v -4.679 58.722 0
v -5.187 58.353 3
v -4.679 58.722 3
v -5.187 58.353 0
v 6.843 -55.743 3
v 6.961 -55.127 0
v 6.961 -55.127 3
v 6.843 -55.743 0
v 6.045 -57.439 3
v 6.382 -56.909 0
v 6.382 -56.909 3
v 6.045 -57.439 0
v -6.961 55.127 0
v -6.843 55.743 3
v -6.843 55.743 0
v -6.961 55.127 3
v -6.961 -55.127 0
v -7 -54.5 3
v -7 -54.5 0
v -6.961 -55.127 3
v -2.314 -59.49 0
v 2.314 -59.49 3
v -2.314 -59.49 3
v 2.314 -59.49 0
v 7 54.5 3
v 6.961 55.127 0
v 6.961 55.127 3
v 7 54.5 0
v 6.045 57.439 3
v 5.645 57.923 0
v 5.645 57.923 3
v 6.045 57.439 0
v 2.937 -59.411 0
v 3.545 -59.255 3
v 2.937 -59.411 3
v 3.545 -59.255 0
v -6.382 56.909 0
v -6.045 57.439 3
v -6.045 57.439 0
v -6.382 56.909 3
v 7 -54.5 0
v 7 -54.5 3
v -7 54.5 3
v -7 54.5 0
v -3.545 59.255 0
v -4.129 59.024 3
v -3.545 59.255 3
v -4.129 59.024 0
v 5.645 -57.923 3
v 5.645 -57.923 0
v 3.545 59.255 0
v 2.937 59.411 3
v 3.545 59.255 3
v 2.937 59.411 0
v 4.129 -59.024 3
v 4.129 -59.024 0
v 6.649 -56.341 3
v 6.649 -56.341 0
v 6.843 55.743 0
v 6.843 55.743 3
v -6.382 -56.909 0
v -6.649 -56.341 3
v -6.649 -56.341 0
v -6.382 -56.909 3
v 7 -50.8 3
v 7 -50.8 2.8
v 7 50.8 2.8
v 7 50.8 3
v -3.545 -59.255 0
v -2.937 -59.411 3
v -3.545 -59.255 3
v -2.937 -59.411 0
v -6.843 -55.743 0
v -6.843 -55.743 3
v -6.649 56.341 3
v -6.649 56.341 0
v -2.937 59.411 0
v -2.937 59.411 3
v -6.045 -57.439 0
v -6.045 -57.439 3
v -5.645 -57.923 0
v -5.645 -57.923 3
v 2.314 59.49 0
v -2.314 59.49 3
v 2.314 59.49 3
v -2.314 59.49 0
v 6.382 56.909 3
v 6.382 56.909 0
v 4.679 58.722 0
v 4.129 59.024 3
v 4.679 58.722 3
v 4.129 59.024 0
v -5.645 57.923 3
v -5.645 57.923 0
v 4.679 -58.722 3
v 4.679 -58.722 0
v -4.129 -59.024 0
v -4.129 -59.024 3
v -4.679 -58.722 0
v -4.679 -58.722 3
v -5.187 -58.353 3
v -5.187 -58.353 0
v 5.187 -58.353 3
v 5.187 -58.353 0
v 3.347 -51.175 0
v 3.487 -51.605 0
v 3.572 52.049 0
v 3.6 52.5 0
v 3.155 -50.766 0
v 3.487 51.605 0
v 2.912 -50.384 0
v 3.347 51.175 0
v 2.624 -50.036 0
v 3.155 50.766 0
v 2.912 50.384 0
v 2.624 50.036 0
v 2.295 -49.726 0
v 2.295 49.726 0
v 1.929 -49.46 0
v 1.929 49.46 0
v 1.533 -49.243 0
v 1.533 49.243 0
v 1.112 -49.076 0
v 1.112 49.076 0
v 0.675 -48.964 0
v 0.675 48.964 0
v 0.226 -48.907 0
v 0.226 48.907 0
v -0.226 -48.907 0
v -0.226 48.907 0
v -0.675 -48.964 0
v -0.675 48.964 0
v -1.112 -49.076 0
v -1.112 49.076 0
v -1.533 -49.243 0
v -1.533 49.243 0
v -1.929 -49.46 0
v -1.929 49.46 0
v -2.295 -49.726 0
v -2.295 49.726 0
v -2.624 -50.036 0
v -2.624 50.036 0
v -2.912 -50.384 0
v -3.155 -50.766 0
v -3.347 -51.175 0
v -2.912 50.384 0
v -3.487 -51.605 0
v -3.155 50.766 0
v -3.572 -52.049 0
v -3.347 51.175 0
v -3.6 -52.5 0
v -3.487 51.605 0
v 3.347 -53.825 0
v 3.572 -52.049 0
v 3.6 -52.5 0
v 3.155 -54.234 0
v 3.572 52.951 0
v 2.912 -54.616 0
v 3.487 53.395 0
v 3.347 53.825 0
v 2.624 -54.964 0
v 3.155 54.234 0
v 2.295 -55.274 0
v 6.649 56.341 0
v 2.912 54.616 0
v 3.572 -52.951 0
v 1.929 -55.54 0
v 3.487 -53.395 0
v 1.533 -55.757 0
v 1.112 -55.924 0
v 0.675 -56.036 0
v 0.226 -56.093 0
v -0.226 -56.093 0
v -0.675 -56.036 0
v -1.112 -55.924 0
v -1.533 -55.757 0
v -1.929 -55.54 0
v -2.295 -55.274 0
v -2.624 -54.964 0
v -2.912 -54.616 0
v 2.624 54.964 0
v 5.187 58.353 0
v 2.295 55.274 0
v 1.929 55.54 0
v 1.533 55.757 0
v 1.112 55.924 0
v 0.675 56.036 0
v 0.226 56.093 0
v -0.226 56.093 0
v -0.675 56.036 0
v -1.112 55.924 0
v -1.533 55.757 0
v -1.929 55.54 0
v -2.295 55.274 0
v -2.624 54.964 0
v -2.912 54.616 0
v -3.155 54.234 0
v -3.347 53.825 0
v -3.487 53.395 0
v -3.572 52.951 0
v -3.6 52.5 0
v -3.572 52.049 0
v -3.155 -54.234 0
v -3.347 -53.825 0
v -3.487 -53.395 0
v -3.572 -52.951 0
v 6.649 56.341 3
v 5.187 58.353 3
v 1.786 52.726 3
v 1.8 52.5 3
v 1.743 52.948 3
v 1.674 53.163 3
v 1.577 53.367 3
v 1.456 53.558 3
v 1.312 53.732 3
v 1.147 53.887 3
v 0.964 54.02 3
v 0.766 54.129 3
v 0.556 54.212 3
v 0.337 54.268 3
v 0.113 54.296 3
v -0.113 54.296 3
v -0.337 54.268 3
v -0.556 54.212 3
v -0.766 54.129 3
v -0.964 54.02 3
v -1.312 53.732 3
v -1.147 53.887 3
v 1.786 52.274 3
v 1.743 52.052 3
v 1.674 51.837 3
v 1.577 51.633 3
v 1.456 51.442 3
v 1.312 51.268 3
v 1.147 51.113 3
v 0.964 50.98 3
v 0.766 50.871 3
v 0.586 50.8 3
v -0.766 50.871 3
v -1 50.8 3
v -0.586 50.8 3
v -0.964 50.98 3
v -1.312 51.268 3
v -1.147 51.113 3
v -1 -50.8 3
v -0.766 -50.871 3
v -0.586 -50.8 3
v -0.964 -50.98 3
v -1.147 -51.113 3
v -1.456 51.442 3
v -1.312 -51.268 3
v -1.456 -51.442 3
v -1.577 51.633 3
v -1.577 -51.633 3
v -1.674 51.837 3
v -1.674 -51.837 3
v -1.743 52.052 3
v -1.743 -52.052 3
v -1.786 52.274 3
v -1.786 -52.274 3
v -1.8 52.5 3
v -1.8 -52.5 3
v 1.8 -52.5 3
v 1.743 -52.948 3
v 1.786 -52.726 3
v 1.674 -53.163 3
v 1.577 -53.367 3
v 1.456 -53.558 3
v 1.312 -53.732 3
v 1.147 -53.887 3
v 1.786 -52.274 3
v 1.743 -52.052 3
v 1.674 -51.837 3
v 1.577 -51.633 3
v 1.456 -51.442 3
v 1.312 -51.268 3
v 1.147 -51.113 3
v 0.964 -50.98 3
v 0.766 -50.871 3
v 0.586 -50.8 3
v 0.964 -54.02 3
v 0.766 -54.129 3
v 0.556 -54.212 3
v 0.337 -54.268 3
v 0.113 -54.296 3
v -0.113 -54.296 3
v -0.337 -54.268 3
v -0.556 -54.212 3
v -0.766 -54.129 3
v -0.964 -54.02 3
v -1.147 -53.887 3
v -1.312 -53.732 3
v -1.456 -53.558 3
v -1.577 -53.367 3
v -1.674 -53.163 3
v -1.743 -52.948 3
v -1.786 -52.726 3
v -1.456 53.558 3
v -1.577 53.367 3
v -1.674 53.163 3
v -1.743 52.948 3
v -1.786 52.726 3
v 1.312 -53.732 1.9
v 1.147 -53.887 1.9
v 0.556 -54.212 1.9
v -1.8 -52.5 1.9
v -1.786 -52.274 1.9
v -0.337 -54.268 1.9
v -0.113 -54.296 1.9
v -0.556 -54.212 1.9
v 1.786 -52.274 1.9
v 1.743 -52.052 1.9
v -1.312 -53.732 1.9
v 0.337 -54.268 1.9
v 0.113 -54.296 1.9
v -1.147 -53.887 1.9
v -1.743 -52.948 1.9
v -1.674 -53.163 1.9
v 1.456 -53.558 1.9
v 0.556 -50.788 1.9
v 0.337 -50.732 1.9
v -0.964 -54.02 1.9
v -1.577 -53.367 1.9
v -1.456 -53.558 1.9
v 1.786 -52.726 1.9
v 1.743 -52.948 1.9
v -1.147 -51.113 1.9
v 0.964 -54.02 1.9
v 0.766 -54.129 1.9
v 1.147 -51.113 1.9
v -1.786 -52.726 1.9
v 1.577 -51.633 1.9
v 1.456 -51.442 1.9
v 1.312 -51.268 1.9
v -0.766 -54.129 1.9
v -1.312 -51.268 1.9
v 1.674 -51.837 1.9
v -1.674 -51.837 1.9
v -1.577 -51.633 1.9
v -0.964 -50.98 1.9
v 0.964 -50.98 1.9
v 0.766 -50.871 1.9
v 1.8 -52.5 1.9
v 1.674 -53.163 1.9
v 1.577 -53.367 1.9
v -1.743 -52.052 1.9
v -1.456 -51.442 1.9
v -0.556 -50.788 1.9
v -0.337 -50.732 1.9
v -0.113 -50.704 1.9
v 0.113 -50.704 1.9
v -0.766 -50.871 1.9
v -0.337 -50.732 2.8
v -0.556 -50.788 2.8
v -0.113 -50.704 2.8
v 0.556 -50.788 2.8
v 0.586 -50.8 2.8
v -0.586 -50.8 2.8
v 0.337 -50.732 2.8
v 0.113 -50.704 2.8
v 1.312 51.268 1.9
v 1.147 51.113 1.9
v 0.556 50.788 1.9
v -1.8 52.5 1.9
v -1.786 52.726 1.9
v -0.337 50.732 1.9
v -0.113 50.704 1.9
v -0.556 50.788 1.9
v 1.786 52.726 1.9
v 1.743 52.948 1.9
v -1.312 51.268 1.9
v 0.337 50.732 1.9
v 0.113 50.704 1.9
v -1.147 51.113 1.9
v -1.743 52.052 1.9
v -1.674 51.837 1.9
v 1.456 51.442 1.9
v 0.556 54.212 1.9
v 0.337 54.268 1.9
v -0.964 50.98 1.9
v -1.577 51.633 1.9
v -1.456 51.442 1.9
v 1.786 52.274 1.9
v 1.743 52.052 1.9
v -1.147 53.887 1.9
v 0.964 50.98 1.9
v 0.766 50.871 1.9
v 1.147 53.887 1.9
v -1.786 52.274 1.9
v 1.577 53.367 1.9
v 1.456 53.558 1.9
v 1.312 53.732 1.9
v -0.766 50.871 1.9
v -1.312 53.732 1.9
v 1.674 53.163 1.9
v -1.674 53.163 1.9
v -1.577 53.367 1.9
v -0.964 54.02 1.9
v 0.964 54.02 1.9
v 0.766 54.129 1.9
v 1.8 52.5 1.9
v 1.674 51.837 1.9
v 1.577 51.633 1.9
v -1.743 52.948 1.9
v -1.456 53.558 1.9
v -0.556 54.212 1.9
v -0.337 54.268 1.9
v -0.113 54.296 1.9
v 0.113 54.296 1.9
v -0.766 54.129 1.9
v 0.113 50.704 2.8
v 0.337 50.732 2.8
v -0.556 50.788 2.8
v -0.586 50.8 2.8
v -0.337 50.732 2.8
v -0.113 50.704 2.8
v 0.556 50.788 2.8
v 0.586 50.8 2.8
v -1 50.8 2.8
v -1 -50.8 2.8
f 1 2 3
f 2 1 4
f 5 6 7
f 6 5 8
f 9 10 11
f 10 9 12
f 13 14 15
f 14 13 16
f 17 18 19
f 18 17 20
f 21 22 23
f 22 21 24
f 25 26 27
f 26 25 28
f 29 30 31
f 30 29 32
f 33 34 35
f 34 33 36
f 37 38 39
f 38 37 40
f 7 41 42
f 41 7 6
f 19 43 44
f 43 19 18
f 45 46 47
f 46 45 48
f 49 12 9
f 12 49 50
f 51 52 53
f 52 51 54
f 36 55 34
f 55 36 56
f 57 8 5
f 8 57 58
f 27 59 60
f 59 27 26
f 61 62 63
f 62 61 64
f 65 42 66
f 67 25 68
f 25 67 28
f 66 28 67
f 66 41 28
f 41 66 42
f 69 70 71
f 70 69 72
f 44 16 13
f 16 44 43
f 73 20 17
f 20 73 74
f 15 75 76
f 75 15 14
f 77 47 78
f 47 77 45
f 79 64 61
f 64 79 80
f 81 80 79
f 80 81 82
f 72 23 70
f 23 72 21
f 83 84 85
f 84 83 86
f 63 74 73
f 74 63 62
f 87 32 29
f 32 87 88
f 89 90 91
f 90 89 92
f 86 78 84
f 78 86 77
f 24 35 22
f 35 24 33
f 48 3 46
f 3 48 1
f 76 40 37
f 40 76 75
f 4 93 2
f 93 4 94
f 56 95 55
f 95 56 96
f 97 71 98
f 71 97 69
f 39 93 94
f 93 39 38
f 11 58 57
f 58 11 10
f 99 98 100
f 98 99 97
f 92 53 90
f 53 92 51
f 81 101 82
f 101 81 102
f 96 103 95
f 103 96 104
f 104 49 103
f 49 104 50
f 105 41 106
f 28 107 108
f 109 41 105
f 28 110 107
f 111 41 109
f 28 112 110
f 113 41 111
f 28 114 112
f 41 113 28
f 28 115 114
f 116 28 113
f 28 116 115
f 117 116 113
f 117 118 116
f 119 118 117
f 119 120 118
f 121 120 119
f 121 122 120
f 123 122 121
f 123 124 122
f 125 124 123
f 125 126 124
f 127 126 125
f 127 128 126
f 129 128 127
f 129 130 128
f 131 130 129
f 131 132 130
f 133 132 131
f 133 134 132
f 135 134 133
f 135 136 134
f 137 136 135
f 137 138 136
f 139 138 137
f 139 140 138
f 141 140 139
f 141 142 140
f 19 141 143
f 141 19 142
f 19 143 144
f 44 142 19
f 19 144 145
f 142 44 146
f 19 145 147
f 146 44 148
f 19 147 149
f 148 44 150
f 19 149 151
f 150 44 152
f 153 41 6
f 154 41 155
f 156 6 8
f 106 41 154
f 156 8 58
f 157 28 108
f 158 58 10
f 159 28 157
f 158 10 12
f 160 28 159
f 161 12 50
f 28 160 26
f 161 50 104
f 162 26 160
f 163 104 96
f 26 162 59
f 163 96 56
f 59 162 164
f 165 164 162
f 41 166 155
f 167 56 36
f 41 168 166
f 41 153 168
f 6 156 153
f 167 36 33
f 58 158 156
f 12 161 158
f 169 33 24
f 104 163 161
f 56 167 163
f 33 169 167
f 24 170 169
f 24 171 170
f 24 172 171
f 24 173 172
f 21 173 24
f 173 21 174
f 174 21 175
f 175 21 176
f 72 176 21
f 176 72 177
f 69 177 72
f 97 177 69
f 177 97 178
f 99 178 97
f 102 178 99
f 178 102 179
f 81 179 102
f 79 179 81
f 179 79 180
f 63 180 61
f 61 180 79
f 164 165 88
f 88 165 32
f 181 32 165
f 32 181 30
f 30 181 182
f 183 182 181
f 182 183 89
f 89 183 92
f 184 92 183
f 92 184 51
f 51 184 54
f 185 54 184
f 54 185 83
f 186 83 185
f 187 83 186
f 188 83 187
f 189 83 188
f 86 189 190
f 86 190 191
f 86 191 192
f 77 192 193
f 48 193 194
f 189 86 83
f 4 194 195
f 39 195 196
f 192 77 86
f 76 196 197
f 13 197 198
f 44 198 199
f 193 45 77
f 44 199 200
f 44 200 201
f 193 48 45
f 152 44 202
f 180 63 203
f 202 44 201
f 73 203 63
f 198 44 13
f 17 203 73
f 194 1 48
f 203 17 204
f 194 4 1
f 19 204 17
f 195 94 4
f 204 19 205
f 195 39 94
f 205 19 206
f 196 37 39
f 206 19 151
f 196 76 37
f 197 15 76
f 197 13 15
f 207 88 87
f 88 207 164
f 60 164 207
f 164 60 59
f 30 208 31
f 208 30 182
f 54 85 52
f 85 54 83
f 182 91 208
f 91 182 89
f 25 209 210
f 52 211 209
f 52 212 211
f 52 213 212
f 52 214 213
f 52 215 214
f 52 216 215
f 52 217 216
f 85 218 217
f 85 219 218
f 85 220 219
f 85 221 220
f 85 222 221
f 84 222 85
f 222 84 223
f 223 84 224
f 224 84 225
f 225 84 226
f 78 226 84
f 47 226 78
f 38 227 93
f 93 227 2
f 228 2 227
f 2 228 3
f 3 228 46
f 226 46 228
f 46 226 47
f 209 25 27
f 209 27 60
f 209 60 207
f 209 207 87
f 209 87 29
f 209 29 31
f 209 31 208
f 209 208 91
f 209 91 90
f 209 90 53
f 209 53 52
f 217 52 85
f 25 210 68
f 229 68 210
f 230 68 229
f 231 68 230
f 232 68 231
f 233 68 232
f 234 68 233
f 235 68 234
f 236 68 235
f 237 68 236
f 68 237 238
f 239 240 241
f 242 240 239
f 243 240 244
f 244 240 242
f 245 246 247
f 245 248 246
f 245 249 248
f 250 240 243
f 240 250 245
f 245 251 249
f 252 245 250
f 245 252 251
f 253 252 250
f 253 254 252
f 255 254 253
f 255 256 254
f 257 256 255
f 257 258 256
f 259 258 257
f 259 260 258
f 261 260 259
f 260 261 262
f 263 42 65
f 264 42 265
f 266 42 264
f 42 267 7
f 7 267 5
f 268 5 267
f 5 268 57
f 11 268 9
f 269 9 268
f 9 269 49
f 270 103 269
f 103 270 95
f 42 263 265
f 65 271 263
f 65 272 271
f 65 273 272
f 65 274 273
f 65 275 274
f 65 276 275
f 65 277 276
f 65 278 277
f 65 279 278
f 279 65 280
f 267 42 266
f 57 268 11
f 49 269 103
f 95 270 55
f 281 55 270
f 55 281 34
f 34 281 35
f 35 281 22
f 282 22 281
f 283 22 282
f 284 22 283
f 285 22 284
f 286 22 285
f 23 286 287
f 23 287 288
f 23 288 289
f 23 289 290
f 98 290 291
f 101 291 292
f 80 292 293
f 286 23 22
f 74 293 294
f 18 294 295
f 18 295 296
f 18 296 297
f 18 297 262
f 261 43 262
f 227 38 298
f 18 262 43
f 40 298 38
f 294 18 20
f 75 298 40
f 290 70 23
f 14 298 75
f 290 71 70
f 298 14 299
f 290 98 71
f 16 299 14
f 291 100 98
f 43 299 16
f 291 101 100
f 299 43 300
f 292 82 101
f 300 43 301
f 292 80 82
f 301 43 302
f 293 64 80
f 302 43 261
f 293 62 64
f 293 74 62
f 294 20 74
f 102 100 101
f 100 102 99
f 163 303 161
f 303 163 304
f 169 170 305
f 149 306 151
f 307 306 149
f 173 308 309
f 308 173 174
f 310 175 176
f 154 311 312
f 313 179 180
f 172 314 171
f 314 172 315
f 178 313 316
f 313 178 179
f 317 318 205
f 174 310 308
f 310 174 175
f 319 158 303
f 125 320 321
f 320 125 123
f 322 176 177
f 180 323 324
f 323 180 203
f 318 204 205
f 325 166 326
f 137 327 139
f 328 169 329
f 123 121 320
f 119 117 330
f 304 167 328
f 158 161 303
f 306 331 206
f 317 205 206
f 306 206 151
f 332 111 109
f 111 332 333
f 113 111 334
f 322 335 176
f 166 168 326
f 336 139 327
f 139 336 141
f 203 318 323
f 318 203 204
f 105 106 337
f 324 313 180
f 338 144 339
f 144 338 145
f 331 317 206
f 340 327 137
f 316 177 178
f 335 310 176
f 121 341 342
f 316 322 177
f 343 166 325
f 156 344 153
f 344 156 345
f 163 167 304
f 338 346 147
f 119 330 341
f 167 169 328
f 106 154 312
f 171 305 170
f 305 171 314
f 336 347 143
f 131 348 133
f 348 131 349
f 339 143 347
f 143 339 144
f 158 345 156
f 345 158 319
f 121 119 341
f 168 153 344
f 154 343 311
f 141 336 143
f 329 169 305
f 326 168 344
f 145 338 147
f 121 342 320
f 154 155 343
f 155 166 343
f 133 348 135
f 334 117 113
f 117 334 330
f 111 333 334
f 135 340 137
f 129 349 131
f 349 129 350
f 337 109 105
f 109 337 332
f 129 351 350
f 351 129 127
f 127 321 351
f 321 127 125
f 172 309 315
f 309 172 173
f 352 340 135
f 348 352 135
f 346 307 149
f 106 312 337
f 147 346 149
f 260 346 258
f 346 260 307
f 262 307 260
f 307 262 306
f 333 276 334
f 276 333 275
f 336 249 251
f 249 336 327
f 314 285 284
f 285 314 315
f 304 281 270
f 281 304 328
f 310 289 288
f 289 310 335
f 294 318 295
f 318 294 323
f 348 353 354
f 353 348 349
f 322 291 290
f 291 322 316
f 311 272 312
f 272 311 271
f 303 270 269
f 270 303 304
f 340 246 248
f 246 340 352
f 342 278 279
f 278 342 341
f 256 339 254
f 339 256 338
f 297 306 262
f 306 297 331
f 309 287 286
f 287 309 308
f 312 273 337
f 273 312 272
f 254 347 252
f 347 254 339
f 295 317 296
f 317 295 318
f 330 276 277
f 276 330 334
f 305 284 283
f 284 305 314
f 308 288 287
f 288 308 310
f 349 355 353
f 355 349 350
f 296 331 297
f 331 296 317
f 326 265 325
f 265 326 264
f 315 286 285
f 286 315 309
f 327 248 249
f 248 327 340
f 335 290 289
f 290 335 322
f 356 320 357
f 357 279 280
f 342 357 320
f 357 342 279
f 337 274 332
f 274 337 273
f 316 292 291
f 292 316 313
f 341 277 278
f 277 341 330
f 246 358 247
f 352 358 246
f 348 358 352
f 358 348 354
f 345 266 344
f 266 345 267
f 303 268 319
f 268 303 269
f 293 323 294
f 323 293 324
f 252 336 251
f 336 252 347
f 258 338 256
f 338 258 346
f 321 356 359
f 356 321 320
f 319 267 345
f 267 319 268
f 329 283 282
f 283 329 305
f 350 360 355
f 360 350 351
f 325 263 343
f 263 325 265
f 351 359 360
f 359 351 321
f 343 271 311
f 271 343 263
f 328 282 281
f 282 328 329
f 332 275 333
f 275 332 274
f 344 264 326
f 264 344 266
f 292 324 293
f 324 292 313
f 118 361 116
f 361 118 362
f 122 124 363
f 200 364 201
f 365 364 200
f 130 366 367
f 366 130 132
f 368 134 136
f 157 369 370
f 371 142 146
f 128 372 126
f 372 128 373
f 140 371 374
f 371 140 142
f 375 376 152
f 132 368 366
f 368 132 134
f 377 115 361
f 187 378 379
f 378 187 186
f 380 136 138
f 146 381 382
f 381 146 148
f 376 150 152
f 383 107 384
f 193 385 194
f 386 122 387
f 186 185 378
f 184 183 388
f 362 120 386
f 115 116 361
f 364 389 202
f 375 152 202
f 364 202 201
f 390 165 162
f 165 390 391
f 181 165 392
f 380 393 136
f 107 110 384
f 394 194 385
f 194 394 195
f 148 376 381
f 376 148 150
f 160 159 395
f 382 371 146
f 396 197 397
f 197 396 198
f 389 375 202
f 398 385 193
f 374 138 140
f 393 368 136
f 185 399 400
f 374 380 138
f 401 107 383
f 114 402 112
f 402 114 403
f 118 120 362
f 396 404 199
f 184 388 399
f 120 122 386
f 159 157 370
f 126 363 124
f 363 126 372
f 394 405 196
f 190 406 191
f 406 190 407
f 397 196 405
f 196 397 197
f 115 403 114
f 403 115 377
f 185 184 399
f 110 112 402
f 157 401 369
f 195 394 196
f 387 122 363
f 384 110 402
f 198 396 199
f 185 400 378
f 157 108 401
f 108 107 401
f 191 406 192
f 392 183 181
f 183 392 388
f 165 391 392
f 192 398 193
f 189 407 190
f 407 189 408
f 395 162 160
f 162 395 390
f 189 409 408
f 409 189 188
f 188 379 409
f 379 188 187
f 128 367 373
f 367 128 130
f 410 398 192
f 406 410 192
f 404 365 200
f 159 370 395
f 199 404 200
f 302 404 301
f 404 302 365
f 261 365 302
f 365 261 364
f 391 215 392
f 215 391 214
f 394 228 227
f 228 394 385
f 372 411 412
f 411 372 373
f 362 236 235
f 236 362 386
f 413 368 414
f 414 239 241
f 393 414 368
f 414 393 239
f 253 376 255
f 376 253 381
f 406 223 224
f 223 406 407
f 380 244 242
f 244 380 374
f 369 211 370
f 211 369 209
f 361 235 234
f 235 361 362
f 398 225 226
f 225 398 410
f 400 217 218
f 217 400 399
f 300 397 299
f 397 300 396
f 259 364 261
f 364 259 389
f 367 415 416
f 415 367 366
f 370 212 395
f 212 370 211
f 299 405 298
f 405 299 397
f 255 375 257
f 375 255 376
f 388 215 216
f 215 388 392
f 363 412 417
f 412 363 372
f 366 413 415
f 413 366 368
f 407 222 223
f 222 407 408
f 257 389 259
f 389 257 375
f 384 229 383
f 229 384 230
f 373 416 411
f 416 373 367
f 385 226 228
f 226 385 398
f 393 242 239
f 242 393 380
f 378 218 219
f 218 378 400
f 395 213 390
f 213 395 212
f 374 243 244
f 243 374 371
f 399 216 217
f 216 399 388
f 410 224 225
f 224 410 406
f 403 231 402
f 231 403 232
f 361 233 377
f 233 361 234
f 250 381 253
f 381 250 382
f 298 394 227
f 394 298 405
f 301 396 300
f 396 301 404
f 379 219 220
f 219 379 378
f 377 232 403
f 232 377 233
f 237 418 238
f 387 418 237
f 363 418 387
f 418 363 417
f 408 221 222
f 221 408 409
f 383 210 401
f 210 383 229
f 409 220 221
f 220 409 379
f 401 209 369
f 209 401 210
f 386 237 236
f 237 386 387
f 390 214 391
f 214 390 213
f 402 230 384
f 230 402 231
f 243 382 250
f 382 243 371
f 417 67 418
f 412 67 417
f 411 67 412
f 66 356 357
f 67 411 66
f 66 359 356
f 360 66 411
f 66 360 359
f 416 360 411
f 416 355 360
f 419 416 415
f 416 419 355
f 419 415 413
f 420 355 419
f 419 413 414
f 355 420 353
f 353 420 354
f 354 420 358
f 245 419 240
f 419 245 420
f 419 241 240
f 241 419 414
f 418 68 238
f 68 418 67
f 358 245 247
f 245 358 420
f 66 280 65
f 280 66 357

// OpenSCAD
$fn = 50;


difference() {
	union() {
		hull() {
			translate(v = [-2.0000000000, 54.5000000000, 0]) {
				cylinder(h = 3, r = 5);
			}
			translate(v = [2.0000000000, 54.5000000000, 0]) {
				cylinder(h = 3, r = 5);
			}
			translate(v = [-2.0000000000, -54.5000000000, 0]) {
				cylinder(h = 3, r = 5);
			}
			translate(v = [2.0000000000, -54.5000000000, 0]) {
				cylinder(h = 3, r = 5);
			}
		}
		hull() {
			translate(v = [-2.0000000000, 54.5000000000, 0]) {
				cylinder(h = 3, r = 5);
			}
			translate(v = [2.0000000000, 54.5000000000, 0]) {
				cylinder(h = 3, r = 5);
			}
			translate(v = [-2.0000000000, -54.5000000000, 0]) {
				cylinder(h = 3, r = 5);
			}
			translate(v = [2.0000000000, -54.5000000000, 0]) {
				cylinder(h = 3, r = 5);
			}
		}
	}
	union() {
		translate(v = [0, -52.5000000000, 0]) {
			rotate(a = [0, 180, 0]) {
				difference() {
					union() {
						translate(v = [0, 0, -17.0000000000]) {
							rotate(a = [0, 0, 0]) {
								difference() {
									union() {
										#translate(v = [-1.7500000000, -3.2500000000, -0.3000000000]) {
											cube(size = [3.5000000000, 6.5000000000, 0.3000000000]);
										}
										#translate(v = [-1.7500000000, -1.7500000000, -0.6000000000]) {
											cube(size = [3.5000000000, 3.5000000000, 0.3000000000]);
										}
										#translate(v = [-1.7500000000, -3.2500000000, 2.5000000000]) {
											cube(size = [3.5000000000, 6.5000000000, 0.3000000000]);
										}
										#translate(v = [-1.7500000000, -1.7500000000, 2.8000000000]) {
											cube(size = [3.5000000000, 3.5000000000, 0.3000000000]);
										}
										#linear_extrude(height = 2.5000000000) {
											polygon(points = [[3.4620000000, 0.0000000000], [1.7310000000, 2.9981799479], [-1.7310000000, 2.9981799479], [-3.4620000000, 0.0000000000], [-1.7310000000, -2.9981799479], [1.7310000000, -2.9981799479]]);
										}
										#translate(v = [-1.7500000000, -3.2500000000, -0.3000000000]) {
											cube(size = [3.5000000000, 6.5000000000, 0.3000000000]);
										}
										#translate(v = [-1.7500000000, -1.7500000000, -0.6000000000]) {
											cube(size = [3.5000000000, 3.5000000000, 0.3000000000]);
										}
										#translate(v = [-1.7500000000, -3.2500000000, 2.5000000000]) {
											cube(size = [3.5000000000, 6.5000000000, 0.3000000000]);
										}
										#translate(v = [-1.7500000000, -1.7500000000, 2.8000000000]) {
											cube(size = [3.5000000000, 3.5000000000, 0.3000000000]);
										}
										#translate(v = [-1.7500000000, -3.2500000000, -0.3000000000]) {
											cube(size = [3.5000000000, 6.5000000000, 0.3000000000]);
										}
										#translate(v = [-1.7500000000, -1.7500000000, -0.6000000000]) {
											cube(size = [3.5000000000, 3.5000000000, 0.3000000000]);
										}
										#translate(v = [-1.7500000000, -3.2500000000, 2.5000000000]) {
											cube(size = [3.5000000000, 6.5000000000, 0.3000000000]);
										}
										#translate(v = [-1.7500000000, -1.7500000000, 2.8000000000]) {
											cube(size = [3.5000000000, 3.5000000000, 0.3000000000]);
										}
									}
									union();
								}
							}
						}
						translate(v = [0, 0, -17.0000000000]) {
							rotate(a = [0, 0, 0]) {
								difference() {
									union() {
										#translate(v = [-1.7500000000, -3.2500000000, -0.3000000000]) {
											cube(size = [3.5000000000, 6.5000000000, 0.3000000000]);
										}
										#translate(v = [-1.7500000000, -1.7500000000, -0.6000000000]) {
											cube(size = [3.5000000000, 3.5000000000, 0.3000000000]);
										}
										#translate(v = [-1.7500000000, -3.2500000000, 2.5000000000]) {
											cube(size = [3.5000000000, 6.5000000000, 0.3000000000]);
										}
										#translate(v = [-1.7500000000, -1.7500000000, 2.8000000000]) {
											cube(size = [3.5000000000, 3.5000000000, 0.3000000000]);
										}
										#linear_extrude(height = 2.5000000000) {
											polygon(points = [[3.4620000000, 0.0000000000], [1.7310000000, 2.9981799479], [-1.7310000000, 2.9981799479], [-3.4620000000, 0.0000000000], [-1.7310000000, -2.9981799479], [1.7310000000, -2.9981799479]]);
										}
										#translate(v = [-1.7500000000, -3.2500000000, -0.3000000000]) {
											cube(size = [3.5000000000, 6.5000000000, 0.3000000000]);
										}
										#translate(v = [-1.7500000000, -1.7500000000, -0.6000000000]) {
											cube(size = [3.5000000000, 3.5000000000, 0.3000000000]);
										}
										#translate(v = [-1.7500000000, -3.2500000000, 2.5000000000]) {
											cube(size = [3.5000000000, 6.5000000000, 0.3000000000]);
										}
										#translate(v = [-1.7500000000, -1.7500000000, 2.8000000000]) {
											cube(size = [3.5000000000, 3.5000000000, 0.3000000000]);
										}
										#translate(v = [-1.7500000000, -3.2500000000, -0.3000000000]) {
											cube(size = [3.5000000000, 6.5000000000, 0.3000000000]);
										}
										#translate(v = [-1.7500000000, -1.7500000000, -0.6000000000]) {
											cube(size = [3.5000000000, 3.5000000000, 0.3000000000]);
										}
										#translate(v = [-1.7500000000, -3.2500000000, 2.5000000000]) {
											cube(size = [3.5000000000, 6.5000000000, 0.3000000000]);
										}
										#translate(v = [-1.7500000000, -1.7500000000, 2.8000000000]) {
											cube(size = [3.5000000000, 3.5000000000, 0.3000000000]);
										}
									}
									union();
								}
							}
						}
						translate(v = [0, 0, -17.0000000000]) {
							rotate(a = [0, 0, 0]) {
								difference() {
									union() {
										#translate(v = [-1.7500000000, -3.2500000000, -0.3000000000]) {
											cube(size = [3.5000000000, 6.5000000000, 0.3000000000]);
										}
										#translate(v = [-1.7500000000, -1.7500000000, -0.6000000000]) {
											cube(size = [3.5000000000, 3.5000000000, 0.3000000000]);
										}
										#translate(v = [-1.7500000000, -3.2500000000, 2.5000000000]) {
											cube(size = [3.5000000000, 6.5000000000, 0.3000000000]);
										}
										#translate(v = [-1.7500000000, -1.7500000000, 2.8000000000]) {
											cube(size = [3.5000000000, 3.5000000000, 0.3000000000]);
										}
										#linear_extrude(height = 2.5000000000) {
											polygon(points = [[3.4620000000, 0.0000000000], [1.7310000000, 2.9981799479], [-1.7310000000, 2.9981799479], [-3.4620000000, 0.0000000000], [-1.7310000000, -2.9981799479], [1.7310000000, -2.9981799479]]);
										}
										#translate(v = [-1.7500000000, -3.2500000000, -0.3000000000]) {
											cube(size = [3.5000000000, 6.5000000000, 0.3000000000]);
										}
										#translate(v = [-1.7500000000, -1.7500000000, -0.6000000000]) {
											cube(size = [3.5000000000, 3.5000000000, 0.3000000000]);
										}
										#translate(v = [-1.7500000000, -3.2500000000, 2.5000000000]) {
											cube(size = [3.5000000000, 6.5000000000, 0.3000000000]);
										}
										#translate(v = [-1.7500000000, -1.7500000000, 2.8000000000]) {
											cube(size = [3.5000000000, 3.5000000000, 0.3000000000]);
										}
										#translate(v = [-1.7500000000, -3.2500000000, -0.3000000000]) {
											cube(size = [3.5000000000, 6.5000000000, 0.3000000000]);
										}
										#translate(v = [-1.7500000000, -1.7500000000, -0.6000000000]) {
											cube(size = [3.5000000000, 3.5000000000, 0.3000000000]);
										}
										#translate(v = [-1.7500000000, -3.2500000000, 2.5000000000]) {
											cube(size = [3.5000000000, 6.5000000000, 0.3000000000]);
										}
										#translate(v = [-1.7500000000, -1.7500000000, 2.8000000000]) {
											cube(size = [3.5000000000, 3.5000000000, 0.3000000000]);
										}
									}
									union();
								}
							}
						}
						#translate(v = [0, 0, -17.0000000000]) {
							cylinder(h = 17, r = 1.5000000000);
						}
						#translate(v = [0, 0, -1.9000000000]) {
							cylinder(h = 1.9000000000, r1 = 1.8000000000, r2 = 3.6000000000);
						}
						#translate(v = [0, 0, -17.0000000000]) {
							cylinder(h = 17, r = 1.8000000000);
						}
						#translate(v = [0, 0, -17.0000000000]) {
							cylinder(h = 17, r = 1.5000000000);
						}
					}
					union();
				}
			}
		}
		translate(v = [0, 52.5000000000, 0]) {
			rotate(a = [0, 180, 0]) {
				difference() {
					union() {
						translate(v = [0, 0, -17.0000000000]) {
							rotate(a = [0, 0, 0]) {
								difference() {
									union() {
										#translate(v = [-1.7500000000, -3.2500000000, -0.3000000000]) {
											cube(size = [3.5000000000, 6.5000000000, 0.3000000000]);
										}
										#translate(v = [-1.7500000000, -1.7500000000, -0.6000000000]) {
											cube(size = [3.5000000000, 3.5000000000, 0.3000000000]);
										}
										#translate(v = [-1.7500000000, -3.2500000000, 2.5000000000]) {
											cube(size = [3.5000000000, 6.5000000000, 0.3000000000]);
										}
										#translate(v = [-1.7500000000, -1.7500000000, 2.8000000000]) {
											cube(size = [3.5000000000, 3.5000000000, 0.3000000000]);
										}
										#linear_extrude(height = 2.5000000000) {
											polygon(points = [[3.4620000000, 0.0000000000], [1.7310000000, 2.9981799479], [-1.7310000000, 2.9981799479], [-3.4620000000, 0.0000000000], [-1.7310000000, -2.9981799479], [1.7310000000, -2.9981799479]]);
										}
										#translate(v = [-1.7500000000, -3.2500000000, -0.3000000000]) {
											cube(size = [3.5000000000, 6.5000000000, 0.3000000000]);
										}
										#translate(v = [-1.7500000000, -1.7500000000, -0.6000000000]) {
											cube(size = [3.5000000000, 3.5000000000, 0.3000000000]);
										}
										#translate(v = [-1.7500000000, -3.2500000000, 2.5000000000]) {
											cube(size = [3.5000000000, 6.5000000000, 0.3000000000]);
										}
										#translate(v = [-1.7500000000, -1.7500000000, 2.8000000000]) {
											cube(size = [3.5000000000, 3.5000000000, 0.3000000000]);
										}
										#translate(v = [-1.7500000000, -3.2500000000, -0.3000000000]) {
											cube(size = [3.5000000000, 6.5000000000, 0.3000000000]);
										}
										#translate(v = [-1.7500000000, -1.7500000000, -0.6000000000]) {
											cube(size = [3.5000000000, 3.5000000000, 0.3000000000]);
										}
										#translate(v = [-1.7500000000, -3.2500000000, 2.5000000000]) {
											cube(size = [3.5000000000, 6.5000000000, 0.3000000000]);
										}
										#translate(v = [-1.7500000000, -1.7500000000, 2.8000000000]) {
											cube(size = [3.5000000000, 3.5000000000, 0.3000000000]);
										}
									}
									union();
								}
							}
						}
						translate(v = [0, 0, -17.0000000000]) {
							rotate(a = [0, 0, 0]) {
								difference() {
									union() {
										#translate(v = [-1.7500000000, -3.2500000000, -0.3000000000]) {
											cube(size = [3.5000000000, 6.5000000000, 0.3000000000]);
										}
										#translate(v = [-1.7500000000, -1.7500000000, -0.6000000000]) {
											cube(size = [3.5000000000, 3.5000000000, 0.3000000000]);
										}
										#translate(v = [-1.7500000000, -3.2500000000, 2.5000000000]) {
											cube(size = [3.5000000000, 6.5000000000, 0.3000000000]);
										}
										#translate(v = [-1.7500000000, -1.7500000000, 2.8000000000]) {
											cube(size = [3.5000000000, 3.5000000000, 0.3000000000]);
										}
										#linear_extrude(height = 2.5000000000) {
											polygon(points = [[3.4620000000, 0.0000000000], [1.7310000000, 2.9981799479], [-1.7310000000, 2.9981799479], [-3.4620000000, 0.0000000000], [-1.7310000000, -2.9981799479], [1.7310000000, -2.9981799479]]);
										}
										#translate(v = [-1.7500000000, -3.2500000000, -0.3000000000]) {
											cube(size = [3.5000000000, 6.5000000000, 0.3000000000]);
										}
										#translate(v = [-1.7500000000, -1.7500000000, -0.6000000000]) {
											cube(size = [3.5000000000, 3.5000000000, 0.3000000000]);
										}
										#translate(v = [-1.7500000000, -3.2500000000, 2.5000000000]) {
											cube(size = [3.5000000000, 6.5000000000, 0.3000000000]);
										}
										#translate(v = [-1.7500000000, -1.7500000000, 2.8000000000]) {
											cube(size = [3.5000000000, 3.5000000000, 0.3000000000]);
										}
										#translate(v = [-1.7500000000, -3.2500000000, -0.3000000000]) {
											cube(size = [3.5000000000, 6.5000000000, 0.3000000000]);
										}
										#translate(v = [-1.7500000000, -1.7500000000, -0.6000000000]) {
											cube(size = [3.5000000000, 3.5000000000, 0.3000000000]);
										}
										#translate(v = [-1.7500000000, -3.2500000000, 2.5000000000]) {
											cube(size = [3.5000000000, 6.5000000000, 0.3000000000]);
										}
										#translate(v = [-1.7500000000, -1.7500000000, 2.8000000000]) {
											cube(size = [3.5000000000, 3.5000000000, 0.3000000000]);
										}
									}
									union();
								}
							}
						}
						translate(v = [0, 0, -17.0000000000]) {
							rotate(a = [0, 0, 0]) {
								difference() {
									union() {
										#translate(v = [-1.7500000000, -3.2500000000, -0.3000000000]) {
											cube(size = [3.5000000000, 6.5000000000, 0.3000000000]);
										}
										#translate(v = [-1.7500000000, -1.7500000000, -0.6000000000]) {
											cube(size = [3.5000000000, 3.5000000000, 0.3000000000]);
										}
										#translate(v = [-1.7500000000, -3.2500000000, 2.5000000000]) {
											cube(size = [3.5000000000, 6.5000000000, 0.3000000000]);
										}
										#translate(v = [-1.7500000000, -1.7500000000, 2.8000000000]) {
											cube(size = [3.5000000000, 3.5000000000, 0.3000000000]);
										}
										#linear_extrude(height = 2.5000000000) {
											polygon(points = [[3.4620000000, 0.0000000000], [1.7310000000, 2.9981799479], [-1.7310000000, 2.9981799479], [-3.4620000000, 0.0000000000], [-1.7310000000, -2.9981799479], [1.7310000000, -2.9981799479]]);
										}
										#translate(v = [-1.7500000000, -3.2500000000, -0.3000000000]) {
											cube(size = [3.5000000000, 6.5000000000, 0.3000000000]);
										}
										#translate(v = [-1.7500000000, -1.7500000000, -0.6000000000]) {
											cube(size = [3.5000000000, 3.5000000000, 0.3000000000]);
										}
										#translate(v = [-1.7500000000, -3.2500000000, 2.5000000000]) {
											cube(size = [3.5000000000, 6.5000000000, 0.3000000000]);
										}
										#translate(v = [-1.7500000000, -1.7500000000, 2.8000000000]) {
											cube(size = [3.5000000000, 3.5000000000, 0.3000000000]);
										}
										#translate(v = [-1.7500000000, -3.2500000000, -0.3000000000]) {
											cube(size = [3.5000000000, 6.5000000000, 0.3000000000]);
										}
										#translate(v = [-1.7500000000, -1.7500000000, -0.6000000000]) {
											cube(size = [3.5000000000, 3.5000000000, 0.3000000000]);
										}
										#translate(v = [-1.7500000000, -3.2500000000, 2.5000000000]) {
											cube(size = [3.5000000000, 6.5000000000, 0.3000000000]);
										}
										#translate(v = [-1.7500000000, -1.7500000000, 2.8000000000]) {
											cube(size = [3.5000000000, 3.5000000000, 0.3000000000]);
										}
									}
									union();
								}
							}
						}
						#translate(v = [0, 0, -17.0000000000]) {
							cylinder(h = 17, r = 1.5000000000);
						}
						#translate(v = [0, 0, -1.9000000000]) {
							cylinder(h = 1.9000000000, r1 = 1.8000000000, r2 = 3.6000000000);
						}
						#translate(v = [0, 0, -17.0000000000]) {
							cylinder(h = 17, r = 1.8000000000);
						}
						#translate(v = [0, 0, -17.0000000000]) {
							cylinder(h = 17, r = 1.5000000000);
						}
					}
					union();
				}
			}
		}
		#translate(v = [-1.0000000000, -50.8000000000, 2.8000000000]) {
			cube(size = [152.4000000000, 101.6000000000, 0.2000000000]);
		}
	}
}
